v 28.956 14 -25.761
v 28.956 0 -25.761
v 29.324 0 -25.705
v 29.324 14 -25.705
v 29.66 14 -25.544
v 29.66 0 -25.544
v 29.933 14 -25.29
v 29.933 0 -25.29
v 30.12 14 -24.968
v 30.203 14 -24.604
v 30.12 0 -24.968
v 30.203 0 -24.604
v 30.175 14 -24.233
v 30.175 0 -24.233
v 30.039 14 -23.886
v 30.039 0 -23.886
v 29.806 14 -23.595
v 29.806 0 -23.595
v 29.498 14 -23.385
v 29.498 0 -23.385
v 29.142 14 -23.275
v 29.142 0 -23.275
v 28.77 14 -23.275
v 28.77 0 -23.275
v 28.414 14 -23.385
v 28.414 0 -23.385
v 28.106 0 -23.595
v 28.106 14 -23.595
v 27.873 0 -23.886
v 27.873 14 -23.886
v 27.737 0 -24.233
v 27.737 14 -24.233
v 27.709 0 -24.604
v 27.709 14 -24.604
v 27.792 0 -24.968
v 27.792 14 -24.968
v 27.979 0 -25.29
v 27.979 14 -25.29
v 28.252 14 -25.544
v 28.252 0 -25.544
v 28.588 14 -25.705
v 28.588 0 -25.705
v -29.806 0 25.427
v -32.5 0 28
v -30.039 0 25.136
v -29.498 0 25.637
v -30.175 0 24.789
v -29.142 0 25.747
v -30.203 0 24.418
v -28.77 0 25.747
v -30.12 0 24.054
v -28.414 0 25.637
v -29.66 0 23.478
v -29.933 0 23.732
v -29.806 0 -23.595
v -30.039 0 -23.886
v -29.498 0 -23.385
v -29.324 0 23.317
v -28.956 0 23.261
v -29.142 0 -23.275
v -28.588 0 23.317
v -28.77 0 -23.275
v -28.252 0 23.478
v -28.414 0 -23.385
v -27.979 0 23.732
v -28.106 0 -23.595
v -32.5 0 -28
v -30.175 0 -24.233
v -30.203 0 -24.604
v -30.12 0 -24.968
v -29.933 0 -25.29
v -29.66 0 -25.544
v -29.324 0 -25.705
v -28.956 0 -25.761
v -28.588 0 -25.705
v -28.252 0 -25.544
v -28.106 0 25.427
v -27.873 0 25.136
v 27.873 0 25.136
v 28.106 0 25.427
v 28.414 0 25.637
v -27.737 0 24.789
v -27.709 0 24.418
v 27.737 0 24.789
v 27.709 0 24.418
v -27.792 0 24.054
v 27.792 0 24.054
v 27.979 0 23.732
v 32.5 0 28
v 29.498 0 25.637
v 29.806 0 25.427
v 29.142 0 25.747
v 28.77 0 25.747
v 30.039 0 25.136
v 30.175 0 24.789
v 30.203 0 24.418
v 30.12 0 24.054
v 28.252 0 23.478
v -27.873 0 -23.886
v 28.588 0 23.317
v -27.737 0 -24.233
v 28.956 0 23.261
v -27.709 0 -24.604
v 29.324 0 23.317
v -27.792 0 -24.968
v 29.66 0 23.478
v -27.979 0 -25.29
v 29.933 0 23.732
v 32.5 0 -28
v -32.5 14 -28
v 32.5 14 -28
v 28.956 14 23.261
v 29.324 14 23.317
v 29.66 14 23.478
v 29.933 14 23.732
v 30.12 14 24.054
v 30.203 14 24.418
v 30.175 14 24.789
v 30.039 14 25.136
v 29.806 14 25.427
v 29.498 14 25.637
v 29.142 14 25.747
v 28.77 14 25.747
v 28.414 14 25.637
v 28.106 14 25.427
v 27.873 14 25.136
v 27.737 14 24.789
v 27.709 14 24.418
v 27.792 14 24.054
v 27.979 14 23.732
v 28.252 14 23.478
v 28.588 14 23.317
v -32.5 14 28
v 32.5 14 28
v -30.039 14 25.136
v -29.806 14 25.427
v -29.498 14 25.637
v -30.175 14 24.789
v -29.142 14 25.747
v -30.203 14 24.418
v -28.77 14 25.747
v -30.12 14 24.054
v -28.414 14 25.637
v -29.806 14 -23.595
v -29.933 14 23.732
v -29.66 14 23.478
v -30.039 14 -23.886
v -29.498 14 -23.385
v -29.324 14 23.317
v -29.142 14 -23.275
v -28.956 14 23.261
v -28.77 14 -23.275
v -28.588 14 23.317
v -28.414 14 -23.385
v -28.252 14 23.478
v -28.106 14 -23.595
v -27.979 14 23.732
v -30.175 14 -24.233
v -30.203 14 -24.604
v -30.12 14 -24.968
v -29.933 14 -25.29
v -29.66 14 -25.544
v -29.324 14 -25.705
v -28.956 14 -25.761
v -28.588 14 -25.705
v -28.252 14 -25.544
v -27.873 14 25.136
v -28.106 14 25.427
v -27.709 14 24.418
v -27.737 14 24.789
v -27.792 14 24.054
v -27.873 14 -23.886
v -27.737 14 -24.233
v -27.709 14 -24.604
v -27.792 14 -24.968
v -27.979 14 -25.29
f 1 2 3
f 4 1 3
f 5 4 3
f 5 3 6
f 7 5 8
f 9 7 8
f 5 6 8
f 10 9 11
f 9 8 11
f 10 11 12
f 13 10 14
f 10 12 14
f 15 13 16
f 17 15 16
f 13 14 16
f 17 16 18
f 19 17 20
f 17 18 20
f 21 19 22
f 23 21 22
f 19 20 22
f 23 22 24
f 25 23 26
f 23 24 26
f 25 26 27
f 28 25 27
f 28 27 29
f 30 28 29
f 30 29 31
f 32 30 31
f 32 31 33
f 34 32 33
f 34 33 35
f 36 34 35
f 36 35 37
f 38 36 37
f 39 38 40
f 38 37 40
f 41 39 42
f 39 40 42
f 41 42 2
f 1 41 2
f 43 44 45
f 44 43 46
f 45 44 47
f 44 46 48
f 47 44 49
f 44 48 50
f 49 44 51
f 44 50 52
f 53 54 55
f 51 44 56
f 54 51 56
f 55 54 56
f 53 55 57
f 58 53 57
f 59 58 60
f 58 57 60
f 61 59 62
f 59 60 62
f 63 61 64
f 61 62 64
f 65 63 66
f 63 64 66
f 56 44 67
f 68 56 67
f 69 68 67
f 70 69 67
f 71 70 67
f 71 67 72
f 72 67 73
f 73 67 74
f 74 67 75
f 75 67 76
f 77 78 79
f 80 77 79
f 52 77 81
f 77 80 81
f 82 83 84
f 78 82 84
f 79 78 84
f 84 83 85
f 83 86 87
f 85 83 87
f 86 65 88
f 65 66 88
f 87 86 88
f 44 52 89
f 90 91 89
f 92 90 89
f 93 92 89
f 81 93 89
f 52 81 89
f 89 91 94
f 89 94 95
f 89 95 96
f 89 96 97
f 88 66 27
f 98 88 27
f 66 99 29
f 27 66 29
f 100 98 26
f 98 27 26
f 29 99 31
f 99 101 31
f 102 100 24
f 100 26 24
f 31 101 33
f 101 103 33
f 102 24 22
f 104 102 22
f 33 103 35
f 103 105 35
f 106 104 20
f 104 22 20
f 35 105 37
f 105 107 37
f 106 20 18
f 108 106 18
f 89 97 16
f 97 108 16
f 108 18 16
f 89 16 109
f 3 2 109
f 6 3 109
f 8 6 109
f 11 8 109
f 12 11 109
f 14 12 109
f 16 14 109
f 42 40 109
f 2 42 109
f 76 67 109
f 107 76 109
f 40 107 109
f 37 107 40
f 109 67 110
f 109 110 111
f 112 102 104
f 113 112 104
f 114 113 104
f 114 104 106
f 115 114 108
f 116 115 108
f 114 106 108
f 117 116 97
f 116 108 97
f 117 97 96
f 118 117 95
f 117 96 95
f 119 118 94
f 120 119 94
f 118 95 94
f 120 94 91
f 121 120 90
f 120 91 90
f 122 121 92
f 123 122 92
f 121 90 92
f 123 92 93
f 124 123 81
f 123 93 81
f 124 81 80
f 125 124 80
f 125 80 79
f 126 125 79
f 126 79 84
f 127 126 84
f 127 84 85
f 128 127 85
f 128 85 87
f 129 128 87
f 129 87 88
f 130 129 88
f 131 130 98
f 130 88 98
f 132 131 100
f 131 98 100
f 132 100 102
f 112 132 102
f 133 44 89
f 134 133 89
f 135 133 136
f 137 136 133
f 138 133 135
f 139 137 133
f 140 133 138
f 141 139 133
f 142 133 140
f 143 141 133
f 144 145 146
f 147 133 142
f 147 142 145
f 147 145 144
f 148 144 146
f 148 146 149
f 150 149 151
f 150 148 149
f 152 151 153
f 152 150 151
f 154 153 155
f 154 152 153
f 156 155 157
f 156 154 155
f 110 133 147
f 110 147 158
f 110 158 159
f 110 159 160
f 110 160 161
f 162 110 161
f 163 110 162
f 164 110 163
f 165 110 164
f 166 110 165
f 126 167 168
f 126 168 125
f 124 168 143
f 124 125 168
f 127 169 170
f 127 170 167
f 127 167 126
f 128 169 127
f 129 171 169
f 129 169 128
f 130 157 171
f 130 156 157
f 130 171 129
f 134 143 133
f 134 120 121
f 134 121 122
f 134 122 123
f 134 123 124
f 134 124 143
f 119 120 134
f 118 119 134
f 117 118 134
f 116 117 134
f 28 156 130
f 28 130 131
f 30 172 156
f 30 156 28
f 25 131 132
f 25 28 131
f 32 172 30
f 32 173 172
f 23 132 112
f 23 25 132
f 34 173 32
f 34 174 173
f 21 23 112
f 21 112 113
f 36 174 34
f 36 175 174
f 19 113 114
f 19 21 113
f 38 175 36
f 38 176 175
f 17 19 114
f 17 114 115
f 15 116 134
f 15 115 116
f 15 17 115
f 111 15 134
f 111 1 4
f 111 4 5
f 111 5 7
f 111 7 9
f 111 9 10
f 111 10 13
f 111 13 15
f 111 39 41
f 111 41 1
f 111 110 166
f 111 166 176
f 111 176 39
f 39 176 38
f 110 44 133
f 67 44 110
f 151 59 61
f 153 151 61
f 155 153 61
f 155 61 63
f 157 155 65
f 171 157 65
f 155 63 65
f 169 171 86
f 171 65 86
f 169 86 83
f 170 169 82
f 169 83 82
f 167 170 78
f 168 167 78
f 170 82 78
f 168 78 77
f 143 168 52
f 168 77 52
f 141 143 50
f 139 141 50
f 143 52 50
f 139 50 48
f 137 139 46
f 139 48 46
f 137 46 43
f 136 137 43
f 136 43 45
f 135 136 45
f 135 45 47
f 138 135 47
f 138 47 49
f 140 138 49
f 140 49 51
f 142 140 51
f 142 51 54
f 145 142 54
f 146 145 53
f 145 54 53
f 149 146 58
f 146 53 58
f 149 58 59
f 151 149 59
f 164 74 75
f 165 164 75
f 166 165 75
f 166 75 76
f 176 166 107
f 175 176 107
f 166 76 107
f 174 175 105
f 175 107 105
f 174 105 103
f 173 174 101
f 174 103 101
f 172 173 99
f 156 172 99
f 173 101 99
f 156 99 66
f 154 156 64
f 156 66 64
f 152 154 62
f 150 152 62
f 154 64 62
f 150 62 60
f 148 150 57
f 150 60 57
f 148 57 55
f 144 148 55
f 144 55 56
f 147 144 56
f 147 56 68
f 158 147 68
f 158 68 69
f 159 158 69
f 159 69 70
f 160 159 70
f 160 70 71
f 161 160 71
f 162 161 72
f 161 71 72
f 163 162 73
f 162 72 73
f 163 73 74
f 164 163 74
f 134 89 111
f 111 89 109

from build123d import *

# Parameters (mm, degrees)
SKETCH1_W           = 65
SKETCH1_H           = 56
BOSS_EXTRUDE1_DEPTH = 14
SKETCH2_R           = 1.25
CUT_EXTRUDE1_DEPTH  = 14


with BuildPart() as part:
    # Sketch1 → Boss-Extrude1 (new body)
    with BuildSketch(Plane(origin=(0, 0, 0), x_dir=(1, 0, 0), z_dir=(0, 1, 0))):
        Rectangle(SKETCH1_W, SKETCH1_H)
    extrude(amount=BOSS_EXTRUDE1_DEPTH)

    # Sketch2 → Cut-Extrude1 (cut)
    with BuildSketch(Plane.XZ):
        with Locations(Location((28.956, 24.511, 0), (0, 0, 270))):
            Circle(SKETCH2_R)
        with Locations(Location((28.956, -24.511, 0), (0, 0, 270))):
            Circle(SKETCH2_R)
        with Locations(Location((-28.956, -24.511, 0), (0, 0, 270))):
            Circle(SKETCH2_R)
        with Locations(Location((-28.956, 24.511, 0), (0, 0, 270))):
            Circle(SKETCH2_R)
    extrude(amount=-CUT_EXTRUDE1_DEPTH, mode=Mode.SUBTRACT)


solid = part.part
